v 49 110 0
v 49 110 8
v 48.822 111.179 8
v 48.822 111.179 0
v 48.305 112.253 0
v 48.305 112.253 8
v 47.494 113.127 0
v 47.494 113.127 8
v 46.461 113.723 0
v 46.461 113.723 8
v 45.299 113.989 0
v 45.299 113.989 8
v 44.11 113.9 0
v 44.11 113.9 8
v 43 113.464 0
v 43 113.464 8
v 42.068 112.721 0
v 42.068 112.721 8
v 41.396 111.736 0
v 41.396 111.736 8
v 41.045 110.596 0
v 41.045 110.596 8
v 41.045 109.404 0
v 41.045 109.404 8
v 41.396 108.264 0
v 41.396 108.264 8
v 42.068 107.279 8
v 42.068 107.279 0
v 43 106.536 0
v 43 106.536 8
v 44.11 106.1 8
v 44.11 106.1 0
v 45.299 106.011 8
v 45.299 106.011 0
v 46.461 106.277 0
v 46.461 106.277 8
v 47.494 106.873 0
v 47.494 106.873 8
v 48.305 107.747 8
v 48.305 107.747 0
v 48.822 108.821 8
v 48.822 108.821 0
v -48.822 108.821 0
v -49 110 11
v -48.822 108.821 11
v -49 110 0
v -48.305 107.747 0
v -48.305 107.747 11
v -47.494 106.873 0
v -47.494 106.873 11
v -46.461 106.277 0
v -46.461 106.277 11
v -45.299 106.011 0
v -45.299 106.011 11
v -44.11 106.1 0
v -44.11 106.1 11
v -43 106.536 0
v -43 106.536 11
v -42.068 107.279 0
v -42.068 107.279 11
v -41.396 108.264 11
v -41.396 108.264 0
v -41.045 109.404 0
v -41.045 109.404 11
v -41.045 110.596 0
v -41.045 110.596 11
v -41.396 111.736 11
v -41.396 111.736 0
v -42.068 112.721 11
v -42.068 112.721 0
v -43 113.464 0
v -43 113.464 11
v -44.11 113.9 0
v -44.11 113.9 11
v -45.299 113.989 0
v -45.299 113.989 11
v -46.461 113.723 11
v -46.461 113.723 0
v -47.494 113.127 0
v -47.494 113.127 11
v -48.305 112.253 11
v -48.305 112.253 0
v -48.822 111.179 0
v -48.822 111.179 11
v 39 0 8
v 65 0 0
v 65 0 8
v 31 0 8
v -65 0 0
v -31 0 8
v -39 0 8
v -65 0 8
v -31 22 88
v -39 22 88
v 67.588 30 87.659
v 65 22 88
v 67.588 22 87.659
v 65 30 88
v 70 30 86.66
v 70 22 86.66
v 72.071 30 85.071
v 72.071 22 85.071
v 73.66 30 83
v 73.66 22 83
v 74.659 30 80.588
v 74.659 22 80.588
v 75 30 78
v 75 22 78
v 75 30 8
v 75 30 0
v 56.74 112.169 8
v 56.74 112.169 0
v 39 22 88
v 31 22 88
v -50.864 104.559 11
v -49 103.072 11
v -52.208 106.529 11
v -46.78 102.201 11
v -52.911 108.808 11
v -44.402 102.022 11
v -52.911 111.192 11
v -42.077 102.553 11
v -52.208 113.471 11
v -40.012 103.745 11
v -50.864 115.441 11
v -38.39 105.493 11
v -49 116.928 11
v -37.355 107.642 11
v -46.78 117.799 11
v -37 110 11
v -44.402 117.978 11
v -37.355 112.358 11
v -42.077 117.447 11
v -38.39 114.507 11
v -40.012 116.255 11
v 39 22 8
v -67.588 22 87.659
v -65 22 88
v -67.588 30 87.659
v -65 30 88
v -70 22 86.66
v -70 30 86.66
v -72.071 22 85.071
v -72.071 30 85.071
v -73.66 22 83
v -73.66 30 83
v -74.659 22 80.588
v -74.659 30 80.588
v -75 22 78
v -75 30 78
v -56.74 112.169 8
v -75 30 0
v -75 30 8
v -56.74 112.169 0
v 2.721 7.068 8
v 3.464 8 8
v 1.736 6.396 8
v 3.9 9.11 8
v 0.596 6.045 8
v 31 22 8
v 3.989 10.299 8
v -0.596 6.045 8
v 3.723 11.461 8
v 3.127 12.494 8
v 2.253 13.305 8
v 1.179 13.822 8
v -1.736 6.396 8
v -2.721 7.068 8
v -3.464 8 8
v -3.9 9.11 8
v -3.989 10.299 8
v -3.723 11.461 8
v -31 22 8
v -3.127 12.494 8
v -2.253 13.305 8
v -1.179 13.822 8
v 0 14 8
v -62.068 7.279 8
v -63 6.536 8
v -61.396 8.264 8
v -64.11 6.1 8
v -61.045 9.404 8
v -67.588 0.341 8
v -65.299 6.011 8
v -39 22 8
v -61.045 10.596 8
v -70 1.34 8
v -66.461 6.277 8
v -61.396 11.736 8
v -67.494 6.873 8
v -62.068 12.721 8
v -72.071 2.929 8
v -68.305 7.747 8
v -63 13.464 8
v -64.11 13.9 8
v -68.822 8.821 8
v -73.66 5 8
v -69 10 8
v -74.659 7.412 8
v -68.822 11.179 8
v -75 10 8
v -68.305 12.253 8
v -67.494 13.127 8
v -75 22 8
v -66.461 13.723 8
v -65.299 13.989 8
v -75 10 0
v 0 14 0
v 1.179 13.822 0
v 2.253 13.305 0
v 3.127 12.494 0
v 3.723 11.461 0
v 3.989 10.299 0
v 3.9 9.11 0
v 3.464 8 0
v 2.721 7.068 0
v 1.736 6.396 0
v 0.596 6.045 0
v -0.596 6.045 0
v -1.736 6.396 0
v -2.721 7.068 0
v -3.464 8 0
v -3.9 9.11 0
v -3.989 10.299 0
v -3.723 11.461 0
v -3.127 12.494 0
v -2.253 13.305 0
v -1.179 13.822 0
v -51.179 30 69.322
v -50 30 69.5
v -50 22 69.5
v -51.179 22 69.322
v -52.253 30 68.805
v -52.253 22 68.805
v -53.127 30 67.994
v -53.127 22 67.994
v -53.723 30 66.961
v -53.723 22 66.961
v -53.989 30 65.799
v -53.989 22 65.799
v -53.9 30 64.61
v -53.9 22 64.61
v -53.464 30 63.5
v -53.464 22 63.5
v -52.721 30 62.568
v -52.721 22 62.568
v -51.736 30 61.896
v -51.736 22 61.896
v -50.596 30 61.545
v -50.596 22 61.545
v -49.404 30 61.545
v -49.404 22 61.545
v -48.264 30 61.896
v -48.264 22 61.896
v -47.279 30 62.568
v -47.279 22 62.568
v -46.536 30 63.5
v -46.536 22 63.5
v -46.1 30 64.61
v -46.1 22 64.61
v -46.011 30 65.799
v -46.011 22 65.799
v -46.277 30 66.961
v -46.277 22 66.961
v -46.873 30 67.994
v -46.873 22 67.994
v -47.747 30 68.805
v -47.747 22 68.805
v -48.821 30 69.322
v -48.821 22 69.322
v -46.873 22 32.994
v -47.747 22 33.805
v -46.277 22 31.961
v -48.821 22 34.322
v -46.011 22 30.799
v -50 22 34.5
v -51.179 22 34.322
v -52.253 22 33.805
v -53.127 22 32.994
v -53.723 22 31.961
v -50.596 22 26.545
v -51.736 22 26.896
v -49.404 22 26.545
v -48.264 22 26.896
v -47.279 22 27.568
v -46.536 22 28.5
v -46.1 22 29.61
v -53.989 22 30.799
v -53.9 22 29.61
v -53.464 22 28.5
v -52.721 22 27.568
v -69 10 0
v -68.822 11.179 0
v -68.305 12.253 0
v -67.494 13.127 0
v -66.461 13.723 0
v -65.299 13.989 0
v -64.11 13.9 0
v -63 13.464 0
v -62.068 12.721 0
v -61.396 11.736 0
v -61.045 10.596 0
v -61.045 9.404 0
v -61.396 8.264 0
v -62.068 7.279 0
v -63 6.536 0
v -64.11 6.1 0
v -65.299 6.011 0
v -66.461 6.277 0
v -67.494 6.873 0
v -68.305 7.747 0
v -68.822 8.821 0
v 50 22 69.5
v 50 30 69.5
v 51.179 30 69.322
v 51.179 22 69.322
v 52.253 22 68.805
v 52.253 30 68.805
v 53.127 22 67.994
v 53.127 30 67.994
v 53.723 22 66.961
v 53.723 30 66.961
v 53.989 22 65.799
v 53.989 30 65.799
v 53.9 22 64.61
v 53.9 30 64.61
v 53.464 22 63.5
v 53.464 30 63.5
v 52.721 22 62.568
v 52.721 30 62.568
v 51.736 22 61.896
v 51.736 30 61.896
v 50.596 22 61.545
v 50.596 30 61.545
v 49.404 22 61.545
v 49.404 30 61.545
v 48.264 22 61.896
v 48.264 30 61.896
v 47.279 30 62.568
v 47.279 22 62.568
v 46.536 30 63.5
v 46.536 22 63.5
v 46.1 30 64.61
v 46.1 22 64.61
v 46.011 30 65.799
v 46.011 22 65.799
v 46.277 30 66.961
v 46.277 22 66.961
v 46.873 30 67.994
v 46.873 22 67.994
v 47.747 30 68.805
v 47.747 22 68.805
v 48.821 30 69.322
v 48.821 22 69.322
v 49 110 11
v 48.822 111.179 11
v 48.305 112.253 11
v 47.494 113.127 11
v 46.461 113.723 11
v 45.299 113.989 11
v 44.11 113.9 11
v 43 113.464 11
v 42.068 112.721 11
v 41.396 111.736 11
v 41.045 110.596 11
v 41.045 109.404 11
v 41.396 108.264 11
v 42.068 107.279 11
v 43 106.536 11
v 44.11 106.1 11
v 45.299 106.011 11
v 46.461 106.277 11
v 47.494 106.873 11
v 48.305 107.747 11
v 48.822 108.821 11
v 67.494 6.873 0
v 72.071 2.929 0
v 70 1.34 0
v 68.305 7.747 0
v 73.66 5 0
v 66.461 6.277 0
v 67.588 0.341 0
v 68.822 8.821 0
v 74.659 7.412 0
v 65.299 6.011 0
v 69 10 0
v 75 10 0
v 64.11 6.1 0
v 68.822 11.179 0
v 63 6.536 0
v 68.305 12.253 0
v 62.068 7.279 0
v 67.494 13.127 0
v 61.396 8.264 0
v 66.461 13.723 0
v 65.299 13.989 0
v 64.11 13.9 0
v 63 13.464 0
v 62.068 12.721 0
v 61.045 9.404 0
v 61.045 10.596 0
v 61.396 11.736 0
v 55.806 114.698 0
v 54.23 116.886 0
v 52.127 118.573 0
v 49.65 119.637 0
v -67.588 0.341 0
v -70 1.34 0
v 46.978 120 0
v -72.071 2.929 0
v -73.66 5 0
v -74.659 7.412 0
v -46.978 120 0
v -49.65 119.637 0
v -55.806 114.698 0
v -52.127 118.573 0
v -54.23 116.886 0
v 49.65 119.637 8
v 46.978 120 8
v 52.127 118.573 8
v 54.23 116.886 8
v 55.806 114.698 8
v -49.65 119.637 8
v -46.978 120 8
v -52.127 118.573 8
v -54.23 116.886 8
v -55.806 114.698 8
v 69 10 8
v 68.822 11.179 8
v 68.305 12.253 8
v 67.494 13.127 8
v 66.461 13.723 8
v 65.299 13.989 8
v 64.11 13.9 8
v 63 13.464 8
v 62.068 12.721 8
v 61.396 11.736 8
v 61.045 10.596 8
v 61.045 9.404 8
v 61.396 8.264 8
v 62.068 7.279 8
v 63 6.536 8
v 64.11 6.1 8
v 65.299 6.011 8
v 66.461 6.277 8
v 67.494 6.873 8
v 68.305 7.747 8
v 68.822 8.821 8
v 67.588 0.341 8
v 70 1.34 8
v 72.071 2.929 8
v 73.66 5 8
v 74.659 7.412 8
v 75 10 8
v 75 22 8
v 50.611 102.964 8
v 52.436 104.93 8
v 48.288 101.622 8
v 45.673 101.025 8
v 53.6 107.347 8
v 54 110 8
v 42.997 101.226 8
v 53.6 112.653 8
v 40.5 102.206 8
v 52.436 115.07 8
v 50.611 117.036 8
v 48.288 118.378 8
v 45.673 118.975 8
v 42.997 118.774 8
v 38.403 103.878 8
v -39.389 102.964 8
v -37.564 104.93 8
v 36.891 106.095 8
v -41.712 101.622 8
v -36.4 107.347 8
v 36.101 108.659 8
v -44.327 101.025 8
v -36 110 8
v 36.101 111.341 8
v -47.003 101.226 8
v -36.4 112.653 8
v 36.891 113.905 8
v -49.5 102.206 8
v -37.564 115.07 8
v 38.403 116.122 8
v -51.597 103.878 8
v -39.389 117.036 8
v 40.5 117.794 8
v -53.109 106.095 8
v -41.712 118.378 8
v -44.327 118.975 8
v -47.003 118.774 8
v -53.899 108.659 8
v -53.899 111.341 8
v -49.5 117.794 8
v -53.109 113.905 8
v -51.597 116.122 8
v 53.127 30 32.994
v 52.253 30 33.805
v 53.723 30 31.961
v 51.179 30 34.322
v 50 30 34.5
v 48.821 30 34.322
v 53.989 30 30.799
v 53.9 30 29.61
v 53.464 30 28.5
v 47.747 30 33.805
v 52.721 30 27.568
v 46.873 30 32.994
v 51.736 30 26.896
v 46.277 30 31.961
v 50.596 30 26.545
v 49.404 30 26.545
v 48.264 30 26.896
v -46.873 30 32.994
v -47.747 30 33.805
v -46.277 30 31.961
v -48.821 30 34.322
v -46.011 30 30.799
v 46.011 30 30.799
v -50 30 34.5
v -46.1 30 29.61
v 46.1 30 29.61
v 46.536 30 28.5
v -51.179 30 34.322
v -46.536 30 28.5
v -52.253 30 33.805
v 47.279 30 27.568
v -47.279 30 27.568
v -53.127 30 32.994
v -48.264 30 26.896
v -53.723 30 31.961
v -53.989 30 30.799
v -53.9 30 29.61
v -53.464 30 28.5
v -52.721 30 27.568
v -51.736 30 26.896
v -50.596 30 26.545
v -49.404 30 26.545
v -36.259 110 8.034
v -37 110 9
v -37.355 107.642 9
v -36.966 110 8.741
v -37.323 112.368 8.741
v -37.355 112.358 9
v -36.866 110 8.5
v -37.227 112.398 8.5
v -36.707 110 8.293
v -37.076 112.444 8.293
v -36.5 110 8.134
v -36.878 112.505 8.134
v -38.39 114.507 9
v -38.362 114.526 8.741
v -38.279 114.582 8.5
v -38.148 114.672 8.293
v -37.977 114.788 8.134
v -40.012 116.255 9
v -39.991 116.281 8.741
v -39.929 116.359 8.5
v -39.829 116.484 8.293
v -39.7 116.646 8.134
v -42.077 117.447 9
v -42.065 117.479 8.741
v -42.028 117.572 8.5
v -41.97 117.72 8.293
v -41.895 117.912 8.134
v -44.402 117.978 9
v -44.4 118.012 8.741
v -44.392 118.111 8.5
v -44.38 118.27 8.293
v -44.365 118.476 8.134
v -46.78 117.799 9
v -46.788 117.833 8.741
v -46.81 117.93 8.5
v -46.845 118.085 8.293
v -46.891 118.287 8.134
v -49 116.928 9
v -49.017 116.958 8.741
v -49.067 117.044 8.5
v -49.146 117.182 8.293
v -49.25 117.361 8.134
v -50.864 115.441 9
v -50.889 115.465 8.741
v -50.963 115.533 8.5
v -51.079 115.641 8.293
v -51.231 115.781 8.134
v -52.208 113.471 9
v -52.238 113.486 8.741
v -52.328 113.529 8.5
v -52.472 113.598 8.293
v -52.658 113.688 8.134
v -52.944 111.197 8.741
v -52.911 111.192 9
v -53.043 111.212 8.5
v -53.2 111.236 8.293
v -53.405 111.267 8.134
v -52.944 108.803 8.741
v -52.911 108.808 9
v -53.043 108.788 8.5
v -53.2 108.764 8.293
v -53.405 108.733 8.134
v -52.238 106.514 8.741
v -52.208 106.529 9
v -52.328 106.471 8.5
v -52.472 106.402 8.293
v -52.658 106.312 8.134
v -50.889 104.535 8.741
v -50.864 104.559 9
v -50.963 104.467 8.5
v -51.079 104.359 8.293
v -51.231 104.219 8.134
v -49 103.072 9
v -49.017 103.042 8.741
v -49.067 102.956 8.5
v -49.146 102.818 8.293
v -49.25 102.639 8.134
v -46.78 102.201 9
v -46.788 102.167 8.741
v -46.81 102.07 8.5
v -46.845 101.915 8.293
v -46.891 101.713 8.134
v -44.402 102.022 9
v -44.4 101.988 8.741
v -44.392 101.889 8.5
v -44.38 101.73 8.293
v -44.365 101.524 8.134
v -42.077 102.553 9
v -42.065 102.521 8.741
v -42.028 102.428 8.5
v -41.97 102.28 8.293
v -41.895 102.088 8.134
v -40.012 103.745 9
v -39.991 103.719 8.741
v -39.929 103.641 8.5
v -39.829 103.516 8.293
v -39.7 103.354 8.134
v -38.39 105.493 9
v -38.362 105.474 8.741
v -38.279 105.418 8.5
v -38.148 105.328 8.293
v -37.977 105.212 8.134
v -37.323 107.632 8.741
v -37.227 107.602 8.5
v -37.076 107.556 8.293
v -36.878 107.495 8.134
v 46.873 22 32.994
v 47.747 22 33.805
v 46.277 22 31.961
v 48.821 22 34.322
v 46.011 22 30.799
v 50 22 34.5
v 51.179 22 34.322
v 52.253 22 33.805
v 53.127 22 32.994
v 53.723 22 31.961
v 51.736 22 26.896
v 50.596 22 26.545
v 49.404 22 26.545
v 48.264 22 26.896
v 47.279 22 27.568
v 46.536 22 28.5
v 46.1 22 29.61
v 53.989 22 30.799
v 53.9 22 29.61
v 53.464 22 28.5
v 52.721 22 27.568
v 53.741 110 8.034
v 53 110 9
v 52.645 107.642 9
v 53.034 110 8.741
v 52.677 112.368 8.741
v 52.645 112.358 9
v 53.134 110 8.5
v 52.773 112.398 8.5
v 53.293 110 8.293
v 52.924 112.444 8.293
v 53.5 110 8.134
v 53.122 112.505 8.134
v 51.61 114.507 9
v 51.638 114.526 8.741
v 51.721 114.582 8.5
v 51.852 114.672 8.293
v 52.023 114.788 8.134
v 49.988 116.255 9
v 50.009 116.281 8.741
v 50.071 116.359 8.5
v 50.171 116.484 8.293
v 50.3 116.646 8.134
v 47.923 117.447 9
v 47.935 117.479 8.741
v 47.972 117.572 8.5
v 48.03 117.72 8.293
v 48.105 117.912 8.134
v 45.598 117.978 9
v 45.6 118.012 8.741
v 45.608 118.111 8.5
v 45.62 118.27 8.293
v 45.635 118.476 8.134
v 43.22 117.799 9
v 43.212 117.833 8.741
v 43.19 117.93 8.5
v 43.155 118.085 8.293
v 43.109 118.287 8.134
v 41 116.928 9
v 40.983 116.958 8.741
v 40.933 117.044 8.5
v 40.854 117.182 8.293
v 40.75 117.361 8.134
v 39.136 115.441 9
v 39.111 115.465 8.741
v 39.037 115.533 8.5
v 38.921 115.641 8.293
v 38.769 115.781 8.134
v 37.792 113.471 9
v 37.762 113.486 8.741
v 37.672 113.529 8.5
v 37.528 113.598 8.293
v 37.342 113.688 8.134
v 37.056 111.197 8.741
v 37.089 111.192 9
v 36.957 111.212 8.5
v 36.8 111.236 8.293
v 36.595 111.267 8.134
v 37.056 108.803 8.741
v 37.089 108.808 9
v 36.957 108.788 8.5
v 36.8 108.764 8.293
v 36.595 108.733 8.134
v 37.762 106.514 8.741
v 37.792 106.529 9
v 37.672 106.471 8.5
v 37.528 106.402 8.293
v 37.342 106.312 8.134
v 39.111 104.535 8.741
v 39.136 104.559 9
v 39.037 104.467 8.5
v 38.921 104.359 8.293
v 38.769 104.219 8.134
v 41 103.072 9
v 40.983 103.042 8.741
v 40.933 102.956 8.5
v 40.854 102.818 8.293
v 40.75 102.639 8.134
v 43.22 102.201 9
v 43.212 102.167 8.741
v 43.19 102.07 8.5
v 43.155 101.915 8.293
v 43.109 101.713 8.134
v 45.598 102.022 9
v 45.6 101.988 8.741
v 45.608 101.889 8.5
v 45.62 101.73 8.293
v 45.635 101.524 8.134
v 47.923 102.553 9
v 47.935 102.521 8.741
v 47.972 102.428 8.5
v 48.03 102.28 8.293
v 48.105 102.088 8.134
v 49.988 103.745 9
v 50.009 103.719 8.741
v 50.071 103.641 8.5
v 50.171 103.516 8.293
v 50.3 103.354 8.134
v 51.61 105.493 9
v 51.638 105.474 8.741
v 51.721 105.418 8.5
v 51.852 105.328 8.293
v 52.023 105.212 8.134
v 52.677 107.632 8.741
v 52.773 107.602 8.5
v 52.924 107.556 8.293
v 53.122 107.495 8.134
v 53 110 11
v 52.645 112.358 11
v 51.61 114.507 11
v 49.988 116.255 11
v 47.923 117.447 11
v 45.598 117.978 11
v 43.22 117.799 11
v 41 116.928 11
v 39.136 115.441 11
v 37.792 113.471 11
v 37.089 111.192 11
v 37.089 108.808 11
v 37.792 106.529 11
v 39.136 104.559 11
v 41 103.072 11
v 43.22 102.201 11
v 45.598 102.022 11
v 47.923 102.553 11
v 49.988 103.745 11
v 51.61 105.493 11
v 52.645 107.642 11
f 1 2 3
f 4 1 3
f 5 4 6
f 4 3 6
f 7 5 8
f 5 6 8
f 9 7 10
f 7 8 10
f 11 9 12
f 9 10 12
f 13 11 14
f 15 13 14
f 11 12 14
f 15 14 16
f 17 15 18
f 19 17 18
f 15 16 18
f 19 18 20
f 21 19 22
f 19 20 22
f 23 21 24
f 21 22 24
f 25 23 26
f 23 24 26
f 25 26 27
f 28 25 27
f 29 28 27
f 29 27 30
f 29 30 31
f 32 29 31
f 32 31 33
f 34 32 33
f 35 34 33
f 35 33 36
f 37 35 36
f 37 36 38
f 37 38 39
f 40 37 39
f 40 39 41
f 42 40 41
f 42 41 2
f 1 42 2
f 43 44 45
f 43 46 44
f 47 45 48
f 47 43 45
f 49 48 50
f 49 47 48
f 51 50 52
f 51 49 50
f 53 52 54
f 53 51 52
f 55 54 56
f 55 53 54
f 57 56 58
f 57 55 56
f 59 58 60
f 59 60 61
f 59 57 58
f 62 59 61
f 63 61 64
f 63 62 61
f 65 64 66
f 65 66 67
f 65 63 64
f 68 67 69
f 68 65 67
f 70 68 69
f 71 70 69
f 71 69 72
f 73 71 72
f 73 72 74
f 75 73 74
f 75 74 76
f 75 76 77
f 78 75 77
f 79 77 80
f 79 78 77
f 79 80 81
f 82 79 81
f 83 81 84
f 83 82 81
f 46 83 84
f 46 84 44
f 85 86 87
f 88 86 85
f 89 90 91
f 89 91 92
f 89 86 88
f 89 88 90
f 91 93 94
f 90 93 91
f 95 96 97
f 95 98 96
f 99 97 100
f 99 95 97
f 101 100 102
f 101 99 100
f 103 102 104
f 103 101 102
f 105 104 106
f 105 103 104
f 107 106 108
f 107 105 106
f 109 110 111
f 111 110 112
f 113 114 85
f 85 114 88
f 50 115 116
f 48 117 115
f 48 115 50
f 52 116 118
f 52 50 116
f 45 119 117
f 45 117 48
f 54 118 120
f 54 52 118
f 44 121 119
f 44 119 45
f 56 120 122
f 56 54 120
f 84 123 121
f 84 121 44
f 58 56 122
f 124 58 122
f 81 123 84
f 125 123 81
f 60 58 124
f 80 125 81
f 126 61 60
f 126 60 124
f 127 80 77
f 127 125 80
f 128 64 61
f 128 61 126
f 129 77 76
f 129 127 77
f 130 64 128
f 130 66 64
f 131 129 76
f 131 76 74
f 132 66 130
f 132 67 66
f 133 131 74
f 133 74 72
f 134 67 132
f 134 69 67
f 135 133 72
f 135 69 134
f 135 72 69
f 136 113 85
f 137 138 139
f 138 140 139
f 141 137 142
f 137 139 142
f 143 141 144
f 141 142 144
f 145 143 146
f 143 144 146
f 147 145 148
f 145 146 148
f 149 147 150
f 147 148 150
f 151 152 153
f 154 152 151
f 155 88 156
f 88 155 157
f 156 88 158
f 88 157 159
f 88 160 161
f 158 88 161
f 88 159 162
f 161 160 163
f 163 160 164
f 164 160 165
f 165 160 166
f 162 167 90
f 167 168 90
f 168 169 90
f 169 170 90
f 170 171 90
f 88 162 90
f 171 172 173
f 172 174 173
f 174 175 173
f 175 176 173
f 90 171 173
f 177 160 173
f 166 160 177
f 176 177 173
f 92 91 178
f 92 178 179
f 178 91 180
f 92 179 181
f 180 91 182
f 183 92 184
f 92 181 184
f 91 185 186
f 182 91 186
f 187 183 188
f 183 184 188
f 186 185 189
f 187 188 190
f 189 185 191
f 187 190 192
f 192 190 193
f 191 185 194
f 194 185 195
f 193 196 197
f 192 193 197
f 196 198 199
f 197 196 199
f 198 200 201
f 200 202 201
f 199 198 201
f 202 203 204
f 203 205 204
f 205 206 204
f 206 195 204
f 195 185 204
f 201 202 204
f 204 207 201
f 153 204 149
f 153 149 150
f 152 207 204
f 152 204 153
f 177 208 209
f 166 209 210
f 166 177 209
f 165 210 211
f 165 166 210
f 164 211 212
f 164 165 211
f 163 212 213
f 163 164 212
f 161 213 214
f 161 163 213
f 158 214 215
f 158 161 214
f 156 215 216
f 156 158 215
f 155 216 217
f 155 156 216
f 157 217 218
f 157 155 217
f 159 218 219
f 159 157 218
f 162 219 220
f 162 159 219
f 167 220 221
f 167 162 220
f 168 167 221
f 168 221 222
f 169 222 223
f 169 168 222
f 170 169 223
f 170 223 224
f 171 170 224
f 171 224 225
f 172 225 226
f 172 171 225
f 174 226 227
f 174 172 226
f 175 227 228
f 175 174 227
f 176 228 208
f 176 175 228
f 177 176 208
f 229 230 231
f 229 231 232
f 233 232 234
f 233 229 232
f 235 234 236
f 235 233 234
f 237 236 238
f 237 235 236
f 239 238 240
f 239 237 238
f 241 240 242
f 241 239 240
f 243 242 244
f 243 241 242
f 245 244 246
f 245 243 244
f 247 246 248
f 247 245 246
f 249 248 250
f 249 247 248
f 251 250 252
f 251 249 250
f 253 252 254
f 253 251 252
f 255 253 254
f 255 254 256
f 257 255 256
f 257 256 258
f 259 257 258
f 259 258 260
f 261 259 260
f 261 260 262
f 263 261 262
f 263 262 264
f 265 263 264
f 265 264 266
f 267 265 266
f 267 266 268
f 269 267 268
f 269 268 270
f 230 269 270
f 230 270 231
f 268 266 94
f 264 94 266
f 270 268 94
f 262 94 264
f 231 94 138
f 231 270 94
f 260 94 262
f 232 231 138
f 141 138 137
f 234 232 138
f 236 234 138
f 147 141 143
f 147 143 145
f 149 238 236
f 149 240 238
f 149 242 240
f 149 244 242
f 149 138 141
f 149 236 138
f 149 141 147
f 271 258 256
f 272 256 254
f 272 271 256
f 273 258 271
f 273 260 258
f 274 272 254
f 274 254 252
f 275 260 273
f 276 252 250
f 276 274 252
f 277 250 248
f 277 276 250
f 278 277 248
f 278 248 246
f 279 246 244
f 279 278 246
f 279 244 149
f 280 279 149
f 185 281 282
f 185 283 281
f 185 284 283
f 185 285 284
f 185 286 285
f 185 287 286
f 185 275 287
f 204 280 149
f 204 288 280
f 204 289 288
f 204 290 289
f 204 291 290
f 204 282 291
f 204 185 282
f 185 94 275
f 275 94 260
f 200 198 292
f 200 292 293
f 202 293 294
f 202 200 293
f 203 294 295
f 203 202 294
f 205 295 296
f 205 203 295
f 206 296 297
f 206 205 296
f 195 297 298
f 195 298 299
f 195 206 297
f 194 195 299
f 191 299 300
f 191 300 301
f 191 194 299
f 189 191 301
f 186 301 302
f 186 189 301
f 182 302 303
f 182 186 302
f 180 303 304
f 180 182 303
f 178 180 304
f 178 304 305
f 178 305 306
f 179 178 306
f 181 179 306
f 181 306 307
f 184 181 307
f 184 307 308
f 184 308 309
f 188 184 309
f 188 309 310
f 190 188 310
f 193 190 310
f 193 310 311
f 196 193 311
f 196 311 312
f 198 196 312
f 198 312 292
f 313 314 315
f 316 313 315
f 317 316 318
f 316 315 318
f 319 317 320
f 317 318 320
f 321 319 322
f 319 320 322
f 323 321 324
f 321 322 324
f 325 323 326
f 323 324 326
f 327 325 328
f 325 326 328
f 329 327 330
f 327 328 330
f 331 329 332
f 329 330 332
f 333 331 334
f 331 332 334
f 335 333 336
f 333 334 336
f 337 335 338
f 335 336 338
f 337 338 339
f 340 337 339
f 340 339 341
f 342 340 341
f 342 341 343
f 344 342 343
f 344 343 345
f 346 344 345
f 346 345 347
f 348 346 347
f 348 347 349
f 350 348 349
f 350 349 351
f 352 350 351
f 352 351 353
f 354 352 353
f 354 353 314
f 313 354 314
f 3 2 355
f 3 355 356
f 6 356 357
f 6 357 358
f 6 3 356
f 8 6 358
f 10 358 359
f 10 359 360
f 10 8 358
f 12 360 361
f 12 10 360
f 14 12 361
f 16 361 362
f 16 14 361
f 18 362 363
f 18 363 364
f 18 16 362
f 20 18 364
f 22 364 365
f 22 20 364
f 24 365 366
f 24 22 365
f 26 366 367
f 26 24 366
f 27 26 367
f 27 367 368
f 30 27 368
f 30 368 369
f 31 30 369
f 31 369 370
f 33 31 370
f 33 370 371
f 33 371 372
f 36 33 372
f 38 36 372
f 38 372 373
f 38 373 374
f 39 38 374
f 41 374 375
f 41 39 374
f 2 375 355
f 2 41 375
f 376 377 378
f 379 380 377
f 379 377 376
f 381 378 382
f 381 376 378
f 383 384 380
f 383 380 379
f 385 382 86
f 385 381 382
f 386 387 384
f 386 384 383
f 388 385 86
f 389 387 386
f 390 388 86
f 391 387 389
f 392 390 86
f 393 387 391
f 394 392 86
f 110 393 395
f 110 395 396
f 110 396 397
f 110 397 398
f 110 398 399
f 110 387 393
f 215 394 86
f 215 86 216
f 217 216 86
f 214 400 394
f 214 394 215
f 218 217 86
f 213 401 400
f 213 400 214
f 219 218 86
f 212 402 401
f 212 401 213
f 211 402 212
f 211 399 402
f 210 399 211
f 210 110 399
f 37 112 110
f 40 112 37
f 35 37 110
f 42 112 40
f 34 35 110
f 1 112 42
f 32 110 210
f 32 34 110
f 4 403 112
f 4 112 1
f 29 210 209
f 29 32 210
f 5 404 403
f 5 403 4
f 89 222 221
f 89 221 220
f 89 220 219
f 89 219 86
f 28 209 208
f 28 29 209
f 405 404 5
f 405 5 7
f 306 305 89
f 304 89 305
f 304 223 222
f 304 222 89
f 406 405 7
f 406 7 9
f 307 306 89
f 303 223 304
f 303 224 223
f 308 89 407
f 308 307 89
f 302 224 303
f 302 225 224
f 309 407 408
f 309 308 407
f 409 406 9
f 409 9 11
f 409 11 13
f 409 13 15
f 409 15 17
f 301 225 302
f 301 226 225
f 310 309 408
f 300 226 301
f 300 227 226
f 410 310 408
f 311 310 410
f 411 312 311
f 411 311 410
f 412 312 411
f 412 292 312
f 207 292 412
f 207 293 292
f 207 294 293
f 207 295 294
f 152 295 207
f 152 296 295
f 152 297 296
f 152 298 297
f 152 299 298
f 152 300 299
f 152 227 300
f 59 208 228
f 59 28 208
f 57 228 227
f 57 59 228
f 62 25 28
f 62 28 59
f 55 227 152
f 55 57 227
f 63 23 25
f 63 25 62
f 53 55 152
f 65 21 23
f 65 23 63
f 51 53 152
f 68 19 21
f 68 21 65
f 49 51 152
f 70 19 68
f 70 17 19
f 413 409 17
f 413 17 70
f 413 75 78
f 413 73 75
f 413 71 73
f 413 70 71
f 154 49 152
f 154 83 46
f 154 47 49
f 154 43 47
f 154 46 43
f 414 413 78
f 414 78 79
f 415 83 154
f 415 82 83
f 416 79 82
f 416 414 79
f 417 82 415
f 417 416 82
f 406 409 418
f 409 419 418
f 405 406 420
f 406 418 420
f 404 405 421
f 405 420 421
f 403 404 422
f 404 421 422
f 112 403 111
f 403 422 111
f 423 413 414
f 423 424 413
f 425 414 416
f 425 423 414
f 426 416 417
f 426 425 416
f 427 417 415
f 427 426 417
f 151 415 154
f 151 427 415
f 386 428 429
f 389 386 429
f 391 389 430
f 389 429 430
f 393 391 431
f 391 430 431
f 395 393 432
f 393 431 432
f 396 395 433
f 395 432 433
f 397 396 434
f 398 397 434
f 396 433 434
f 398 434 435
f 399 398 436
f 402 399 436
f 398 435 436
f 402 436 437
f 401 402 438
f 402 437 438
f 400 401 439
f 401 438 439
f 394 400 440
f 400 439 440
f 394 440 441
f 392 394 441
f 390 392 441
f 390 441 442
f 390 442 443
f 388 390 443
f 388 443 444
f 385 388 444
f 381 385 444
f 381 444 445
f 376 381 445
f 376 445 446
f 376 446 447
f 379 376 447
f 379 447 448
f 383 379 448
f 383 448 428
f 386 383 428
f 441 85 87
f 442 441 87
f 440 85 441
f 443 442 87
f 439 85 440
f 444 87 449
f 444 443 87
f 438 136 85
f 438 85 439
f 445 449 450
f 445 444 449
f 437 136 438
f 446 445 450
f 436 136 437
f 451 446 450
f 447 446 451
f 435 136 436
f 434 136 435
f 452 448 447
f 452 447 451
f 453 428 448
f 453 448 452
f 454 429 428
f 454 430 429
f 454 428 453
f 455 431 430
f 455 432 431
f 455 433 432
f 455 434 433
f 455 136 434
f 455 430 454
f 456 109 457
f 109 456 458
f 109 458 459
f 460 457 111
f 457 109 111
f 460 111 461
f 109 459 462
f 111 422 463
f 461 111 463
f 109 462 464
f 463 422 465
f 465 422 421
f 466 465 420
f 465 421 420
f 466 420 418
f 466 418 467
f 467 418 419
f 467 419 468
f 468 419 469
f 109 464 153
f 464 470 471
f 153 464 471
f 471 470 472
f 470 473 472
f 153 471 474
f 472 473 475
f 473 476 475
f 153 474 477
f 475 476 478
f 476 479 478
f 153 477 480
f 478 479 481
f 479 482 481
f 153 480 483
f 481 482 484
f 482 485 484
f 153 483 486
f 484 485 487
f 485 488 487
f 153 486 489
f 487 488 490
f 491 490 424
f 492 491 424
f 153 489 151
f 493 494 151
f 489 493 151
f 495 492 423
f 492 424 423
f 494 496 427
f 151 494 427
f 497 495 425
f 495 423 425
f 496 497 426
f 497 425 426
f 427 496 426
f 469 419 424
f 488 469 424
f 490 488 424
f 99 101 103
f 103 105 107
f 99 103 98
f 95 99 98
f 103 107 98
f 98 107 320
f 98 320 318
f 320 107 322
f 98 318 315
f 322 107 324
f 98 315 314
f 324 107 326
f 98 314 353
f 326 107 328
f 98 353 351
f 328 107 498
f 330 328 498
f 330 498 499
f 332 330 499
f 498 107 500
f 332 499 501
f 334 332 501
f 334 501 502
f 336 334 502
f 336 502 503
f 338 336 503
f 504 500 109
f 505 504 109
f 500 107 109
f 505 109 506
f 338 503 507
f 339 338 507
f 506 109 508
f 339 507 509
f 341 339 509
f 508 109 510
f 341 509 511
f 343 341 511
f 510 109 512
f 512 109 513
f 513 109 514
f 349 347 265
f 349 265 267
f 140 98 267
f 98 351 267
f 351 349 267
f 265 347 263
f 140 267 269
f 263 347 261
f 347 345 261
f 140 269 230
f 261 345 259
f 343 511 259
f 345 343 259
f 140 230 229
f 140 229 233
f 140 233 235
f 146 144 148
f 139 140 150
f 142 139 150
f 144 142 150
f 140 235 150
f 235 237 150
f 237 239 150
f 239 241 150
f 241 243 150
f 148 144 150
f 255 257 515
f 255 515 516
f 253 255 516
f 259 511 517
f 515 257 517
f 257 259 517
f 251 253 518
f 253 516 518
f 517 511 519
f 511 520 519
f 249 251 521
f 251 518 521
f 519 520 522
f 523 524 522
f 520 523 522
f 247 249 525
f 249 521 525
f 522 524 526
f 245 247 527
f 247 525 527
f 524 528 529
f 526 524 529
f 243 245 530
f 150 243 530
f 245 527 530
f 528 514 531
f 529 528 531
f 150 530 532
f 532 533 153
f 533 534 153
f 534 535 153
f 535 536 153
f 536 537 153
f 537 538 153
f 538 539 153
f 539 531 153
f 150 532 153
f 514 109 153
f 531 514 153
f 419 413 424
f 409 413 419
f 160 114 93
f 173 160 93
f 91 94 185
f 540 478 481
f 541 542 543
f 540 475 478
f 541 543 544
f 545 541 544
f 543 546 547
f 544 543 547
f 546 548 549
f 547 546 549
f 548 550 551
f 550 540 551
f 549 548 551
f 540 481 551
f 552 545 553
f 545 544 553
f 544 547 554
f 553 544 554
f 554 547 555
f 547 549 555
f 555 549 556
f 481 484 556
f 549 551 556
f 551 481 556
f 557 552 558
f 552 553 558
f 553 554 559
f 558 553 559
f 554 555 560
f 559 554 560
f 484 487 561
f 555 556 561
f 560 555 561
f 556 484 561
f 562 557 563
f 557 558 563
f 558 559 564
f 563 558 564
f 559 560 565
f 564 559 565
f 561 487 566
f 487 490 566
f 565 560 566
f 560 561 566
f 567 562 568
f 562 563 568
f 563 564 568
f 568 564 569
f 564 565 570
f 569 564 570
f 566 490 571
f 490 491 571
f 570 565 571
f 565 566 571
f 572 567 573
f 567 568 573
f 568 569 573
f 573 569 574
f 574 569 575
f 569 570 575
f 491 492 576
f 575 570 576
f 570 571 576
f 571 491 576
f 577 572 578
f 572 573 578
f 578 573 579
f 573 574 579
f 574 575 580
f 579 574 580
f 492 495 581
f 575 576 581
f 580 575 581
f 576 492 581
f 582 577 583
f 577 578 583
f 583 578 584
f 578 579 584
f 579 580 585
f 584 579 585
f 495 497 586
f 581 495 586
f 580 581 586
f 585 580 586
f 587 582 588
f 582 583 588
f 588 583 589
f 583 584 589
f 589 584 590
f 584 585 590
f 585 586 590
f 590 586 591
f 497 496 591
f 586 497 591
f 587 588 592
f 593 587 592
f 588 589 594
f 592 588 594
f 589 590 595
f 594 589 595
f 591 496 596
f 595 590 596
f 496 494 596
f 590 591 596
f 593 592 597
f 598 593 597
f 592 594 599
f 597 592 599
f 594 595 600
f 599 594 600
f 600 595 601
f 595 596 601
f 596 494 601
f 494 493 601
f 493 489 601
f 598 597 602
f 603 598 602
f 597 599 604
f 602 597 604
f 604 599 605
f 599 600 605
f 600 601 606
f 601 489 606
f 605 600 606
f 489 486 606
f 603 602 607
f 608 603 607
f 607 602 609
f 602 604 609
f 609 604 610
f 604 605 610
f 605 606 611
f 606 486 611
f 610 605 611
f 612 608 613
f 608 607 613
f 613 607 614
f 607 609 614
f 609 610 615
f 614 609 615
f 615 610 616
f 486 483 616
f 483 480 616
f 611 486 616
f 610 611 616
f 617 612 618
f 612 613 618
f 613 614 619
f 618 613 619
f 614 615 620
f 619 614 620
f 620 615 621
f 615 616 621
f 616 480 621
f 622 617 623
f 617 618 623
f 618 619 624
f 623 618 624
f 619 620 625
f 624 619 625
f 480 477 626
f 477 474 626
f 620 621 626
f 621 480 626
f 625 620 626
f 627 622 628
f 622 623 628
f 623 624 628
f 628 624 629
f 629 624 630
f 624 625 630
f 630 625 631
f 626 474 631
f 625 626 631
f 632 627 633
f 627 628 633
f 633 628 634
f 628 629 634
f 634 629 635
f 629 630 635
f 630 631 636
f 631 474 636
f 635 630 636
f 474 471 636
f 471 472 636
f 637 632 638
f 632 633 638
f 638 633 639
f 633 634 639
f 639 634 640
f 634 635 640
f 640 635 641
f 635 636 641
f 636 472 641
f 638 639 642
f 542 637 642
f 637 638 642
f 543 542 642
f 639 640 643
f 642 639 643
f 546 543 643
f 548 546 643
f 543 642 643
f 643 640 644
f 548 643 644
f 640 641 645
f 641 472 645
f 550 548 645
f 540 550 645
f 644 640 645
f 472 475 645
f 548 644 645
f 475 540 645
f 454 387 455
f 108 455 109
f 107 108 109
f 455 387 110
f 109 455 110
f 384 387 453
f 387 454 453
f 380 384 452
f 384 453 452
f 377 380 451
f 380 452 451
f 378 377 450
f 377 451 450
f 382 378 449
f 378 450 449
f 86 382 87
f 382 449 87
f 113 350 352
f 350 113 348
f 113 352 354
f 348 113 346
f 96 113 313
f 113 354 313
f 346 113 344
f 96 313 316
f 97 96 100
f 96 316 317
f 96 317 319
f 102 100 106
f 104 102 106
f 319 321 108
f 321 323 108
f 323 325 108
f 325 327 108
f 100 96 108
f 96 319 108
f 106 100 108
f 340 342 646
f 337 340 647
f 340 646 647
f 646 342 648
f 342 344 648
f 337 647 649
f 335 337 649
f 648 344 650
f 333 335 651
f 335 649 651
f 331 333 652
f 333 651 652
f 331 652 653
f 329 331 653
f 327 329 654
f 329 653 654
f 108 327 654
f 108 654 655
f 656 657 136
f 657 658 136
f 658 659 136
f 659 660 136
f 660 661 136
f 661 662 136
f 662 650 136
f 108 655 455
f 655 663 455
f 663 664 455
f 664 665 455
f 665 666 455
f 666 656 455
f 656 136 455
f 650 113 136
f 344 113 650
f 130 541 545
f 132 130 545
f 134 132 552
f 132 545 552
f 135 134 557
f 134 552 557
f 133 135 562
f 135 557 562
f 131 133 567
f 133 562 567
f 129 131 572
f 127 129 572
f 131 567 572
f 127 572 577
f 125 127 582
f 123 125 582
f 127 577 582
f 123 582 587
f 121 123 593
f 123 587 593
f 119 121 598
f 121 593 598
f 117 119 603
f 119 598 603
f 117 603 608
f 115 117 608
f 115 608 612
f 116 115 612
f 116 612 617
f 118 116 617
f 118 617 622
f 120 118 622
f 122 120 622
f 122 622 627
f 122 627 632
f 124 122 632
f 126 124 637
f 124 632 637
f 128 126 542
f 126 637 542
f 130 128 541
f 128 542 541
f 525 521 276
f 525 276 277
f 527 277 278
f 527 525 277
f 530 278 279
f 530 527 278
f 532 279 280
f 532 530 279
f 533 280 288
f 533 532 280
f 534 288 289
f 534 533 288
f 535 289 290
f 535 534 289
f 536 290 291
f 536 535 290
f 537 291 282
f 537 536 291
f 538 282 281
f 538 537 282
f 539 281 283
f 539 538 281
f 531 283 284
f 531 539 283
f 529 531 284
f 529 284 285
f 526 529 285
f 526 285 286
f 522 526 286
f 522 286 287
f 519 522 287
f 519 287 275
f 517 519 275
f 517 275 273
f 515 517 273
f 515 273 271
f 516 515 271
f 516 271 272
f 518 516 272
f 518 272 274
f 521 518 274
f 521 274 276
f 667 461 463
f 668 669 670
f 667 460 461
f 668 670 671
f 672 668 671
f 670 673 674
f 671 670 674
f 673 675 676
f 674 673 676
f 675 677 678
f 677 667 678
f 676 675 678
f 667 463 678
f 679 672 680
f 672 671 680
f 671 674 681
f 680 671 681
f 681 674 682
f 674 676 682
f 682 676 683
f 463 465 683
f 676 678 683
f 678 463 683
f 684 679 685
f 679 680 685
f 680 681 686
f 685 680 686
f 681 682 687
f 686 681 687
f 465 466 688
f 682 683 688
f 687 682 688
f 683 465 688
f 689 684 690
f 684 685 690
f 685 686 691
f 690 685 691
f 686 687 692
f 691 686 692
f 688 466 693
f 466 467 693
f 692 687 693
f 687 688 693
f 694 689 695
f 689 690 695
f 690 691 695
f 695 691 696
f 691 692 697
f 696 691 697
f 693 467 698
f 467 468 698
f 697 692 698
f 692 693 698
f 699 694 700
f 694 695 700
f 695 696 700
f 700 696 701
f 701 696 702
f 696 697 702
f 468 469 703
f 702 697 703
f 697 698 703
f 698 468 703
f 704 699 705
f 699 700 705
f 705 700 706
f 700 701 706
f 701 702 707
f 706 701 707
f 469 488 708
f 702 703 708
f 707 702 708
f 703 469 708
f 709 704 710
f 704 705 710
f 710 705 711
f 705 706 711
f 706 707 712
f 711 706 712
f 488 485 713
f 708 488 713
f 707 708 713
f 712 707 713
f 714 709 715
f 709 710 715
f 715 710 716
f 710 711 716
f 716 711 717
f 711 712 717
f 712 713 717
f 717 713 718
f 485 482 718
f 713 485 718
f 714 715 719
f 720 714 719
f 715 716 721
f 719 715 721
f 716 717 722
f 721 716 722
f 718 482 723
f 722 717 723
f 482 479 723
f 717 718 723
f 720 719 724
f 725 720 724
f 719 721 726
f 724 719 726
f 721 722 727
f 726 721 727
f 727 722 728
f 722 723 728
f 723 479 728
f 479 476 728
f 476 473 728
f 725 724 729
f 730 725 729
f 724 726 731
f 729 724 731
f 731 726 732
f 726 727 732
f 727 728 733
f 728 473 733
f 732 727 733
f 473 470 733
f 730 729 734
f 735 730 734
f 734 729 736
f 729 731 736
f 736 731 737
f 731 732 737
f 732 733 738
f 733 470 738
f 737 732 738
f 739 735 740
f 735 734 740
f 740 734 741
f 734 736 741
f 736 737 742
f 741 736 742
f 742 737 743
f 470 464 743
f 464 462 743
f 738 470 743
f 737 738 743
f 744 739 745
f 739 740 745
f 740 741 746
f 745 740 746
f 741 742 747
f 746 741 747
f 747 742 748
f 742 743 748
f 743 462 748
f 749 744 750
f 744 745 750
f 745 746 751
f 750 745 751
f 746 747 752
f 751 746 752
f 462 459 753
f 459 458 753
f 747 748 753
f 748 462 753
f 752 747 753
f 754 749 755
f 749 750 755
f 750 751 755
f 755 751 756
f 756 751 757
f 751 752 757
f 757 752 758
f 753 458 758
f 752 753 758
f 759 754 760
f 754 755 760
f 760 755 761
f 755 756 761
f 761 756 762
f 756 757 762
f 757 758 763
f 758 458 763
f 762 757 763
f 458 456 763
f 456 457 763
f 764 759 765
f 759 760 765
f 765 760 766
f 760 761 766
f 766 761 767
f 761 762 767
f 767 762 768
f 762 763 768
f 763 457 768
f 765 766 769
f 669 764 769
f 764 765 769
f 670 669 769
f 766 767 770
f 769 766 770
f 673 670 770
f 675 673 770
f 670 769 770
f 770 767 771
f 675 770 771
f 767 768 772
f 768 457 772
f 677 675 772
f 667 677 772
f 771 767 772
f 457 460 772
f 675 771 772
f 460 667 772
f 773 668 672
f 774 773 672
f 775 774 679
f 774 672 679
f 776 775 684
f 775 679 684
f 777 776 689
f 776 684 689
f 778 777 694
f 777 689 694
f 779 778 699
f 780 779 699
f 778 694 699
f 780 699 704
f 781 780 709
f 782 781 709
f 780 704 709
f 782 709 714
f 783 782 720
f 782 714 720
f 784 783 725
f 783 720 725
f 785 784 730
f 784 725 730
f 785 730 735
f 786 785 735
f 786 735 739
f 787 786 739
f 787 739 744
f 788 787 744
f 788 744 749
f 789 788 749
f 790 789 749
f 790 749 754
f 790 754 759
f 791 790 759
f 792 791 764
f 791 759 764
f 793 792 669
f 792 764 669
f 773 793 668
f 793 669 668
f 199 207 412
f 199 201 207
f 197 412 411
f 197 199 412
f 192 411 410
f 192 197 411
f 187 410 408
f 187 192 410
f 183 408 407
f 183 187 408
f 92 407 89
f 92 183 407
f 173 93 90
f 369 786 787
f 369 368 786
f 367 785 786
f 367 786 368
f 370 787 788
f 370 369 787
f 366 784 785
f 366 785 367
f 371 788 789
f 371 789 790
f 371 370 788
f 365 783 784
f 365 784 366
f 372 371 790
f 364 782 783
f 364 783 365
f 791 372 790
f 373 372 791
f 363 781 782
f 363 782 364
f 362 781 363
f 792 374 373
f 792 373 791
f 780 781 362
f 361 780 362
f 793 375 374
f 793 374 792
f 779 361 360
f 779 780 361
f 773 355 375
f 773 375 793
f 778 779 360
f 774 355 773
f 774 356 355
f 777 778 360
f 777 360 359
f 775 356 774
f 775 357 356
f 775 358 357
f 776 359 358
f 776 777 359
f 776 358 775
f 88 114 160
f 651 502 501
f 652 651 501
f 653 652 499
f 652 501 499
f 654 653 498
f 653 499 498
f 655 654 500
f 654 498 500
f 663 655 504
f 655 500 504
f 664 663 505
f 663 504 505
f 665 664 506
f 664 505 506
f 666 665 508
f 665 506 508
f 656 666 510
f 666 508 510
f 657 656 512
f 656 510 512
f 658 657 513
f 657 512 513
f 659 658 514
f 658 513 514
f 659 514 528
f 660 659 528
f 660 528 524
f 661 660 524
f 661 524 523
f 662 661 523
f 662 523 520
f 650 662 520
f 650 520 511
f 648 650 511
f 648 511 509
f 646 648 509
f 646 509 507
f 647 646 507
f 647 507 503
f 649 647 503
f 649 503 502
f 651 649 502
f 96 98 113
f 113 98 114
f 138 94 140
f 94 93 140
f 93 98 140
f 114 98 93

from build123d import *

# Parameters (mm, degrees)
EXTRUDE_1_DEPTH     = 8
SKETCH_2_R          = 4
CUT_EXTRUDE_1_DEPTH = 142.73566947
SKETCH_3_W          = 75
SKETCH_3_H          = 8
EXTRUDE_2_DEPTH     = 80
SKETCH_5_R          = 4
CUT_EXTRUDE_2_DEPTH = 147.523035732
RIB_1_REACH         = 156.091
SKETCH_6_WALL_W     = 393.151638598
SKETCH_6_WALL_H     = 8
FILLET_2_R          = 10
SKETCH_7_R          = 8
SKETCH_7_R_2        = 4
EXTRUDE_3_DEPTH     = 3
FILLET_3_R          = 1


with BuildPart() as part:
    # Эскиз1 → Бобышка-Вытянуть1 (new body)
    with BuildSketch(Plane.XY):
        Polygon((0, 0), (75, 0), (75, 30), (55, 120), (0, 120), align=None)
    extrude(amount=EXTRUDE_1_DEPTH)

    # Эскиз2 → Вырез-Вытянуть1 (cut, through all)
    with BuildSketch(Plane.XY.offset(8)):
        with Locations((45, 110)):
            Circle(SKETCH_2_R)
        with Locations((0, 10)):
            Circle(SKETCH_2_R)
        with Locations((65, 10)):
            Circle(SKETCH_2_R)
    extrude(amount=-CUT_EXTRUDE_1_DEPTH, mode=Mode.SUBTRACT)

    # Эскиз3 → Бобышка-Вытянуть2 (add)
    with BuildSketch(Plane.XY.offset(8)):
        with Locations((37.5, 26)):
            Rectangle(SKETCH_3_W, SKETCH_3_H)
    extrude(amount=EXTRUDE_2_DEPTH)

    # Эскиз5 → Вырез-Вытянуть2 (cut, through all)
    with BuildSketch(Plane(origin=(0, 30, 0), x_dir=(1, 0, 0), z_dir=(0, 1, 0))):
        with Locations(Location((50, -30.5, 0), (0, 0, 270))):
            Circle(SKETCH_5_R)
        with Locations(Location((50, -65.5, 0), (0, 0, 270))):
            Circle(SKETCH_5_R)
    extrude(amount=-CUT_EXTRUDE_2_DEPTH, mode=Mode.SUBTRACT)

    # Эскиз6 wall → Ребро1 (add, up to next)
    with BuildSketch(Plane(origin=(35, 11, 48), x_dir=(0, -0.265156483021, -0.964205392804), z_dir=(0, 0.964205392804, -0.265156483021)), mode=Mode.PRIVATE) as rib_1_sk1:
        Rectangle(SKETCH_6_WALL_W, SKETCH_6_WALL_H)
    rib_1_tool1 = extrude(rib_1_sk1.sketch, amount=RIB_1_REACH, mode=Mode.PRIVATE) - part.part
    add(rib_1_tool1.solids().sort_by_distance((35, 11, 48))[0])

    # Скругление2
    fillet_2_edges = [part.edges().sort_by_distance(p)[0] for p in [
        (55, 120, 4),
        (75, 0, 4),
        (75, 26, 88),
    ]]
    fillet(fillet_2_edges, radius=FILLET_2_R)

    # Зеркальное отражение1: part across plane


with BuildPart() as part_1:
    add(part.part)
    add(part.part.mirror(Plane(origin=(0, 120, 8), x_dir=(0, 0, 1), z_dir=(1, 0, 0))))

    # Эскиз7 → Бобышка-Вытянуть3 (add)
    with BuildSketch(Plane.XY.offset(8)):
        with Locations((-45, 110)):
            Circle(SKETCH_7_R)
        with Locations(Location((-45, 110, 0), (0, 0, 180))):
            Circle(SKETCH_7_R_2, mode=Mode.SUBTRACT)
        with Locations((45, 110)):
            Circle(SKETCH_7_R)
        with Locations((45, 110)):
            Circle(SKETCH_7_R_2, mode=Mode.SUBTRACT)
    extrude(amount=EXTRUDE_3_DEPTH)

    # Скругление3
    fillet_3_edges = [part_1.edges().sort_by_distance(p)[0] for p in [
        (-53, 110, 8),
        (37, 110, 8),
    ]]
    fillet(fillet_3_edges, radius=FILLET_3_R)


solid = part_1.part
